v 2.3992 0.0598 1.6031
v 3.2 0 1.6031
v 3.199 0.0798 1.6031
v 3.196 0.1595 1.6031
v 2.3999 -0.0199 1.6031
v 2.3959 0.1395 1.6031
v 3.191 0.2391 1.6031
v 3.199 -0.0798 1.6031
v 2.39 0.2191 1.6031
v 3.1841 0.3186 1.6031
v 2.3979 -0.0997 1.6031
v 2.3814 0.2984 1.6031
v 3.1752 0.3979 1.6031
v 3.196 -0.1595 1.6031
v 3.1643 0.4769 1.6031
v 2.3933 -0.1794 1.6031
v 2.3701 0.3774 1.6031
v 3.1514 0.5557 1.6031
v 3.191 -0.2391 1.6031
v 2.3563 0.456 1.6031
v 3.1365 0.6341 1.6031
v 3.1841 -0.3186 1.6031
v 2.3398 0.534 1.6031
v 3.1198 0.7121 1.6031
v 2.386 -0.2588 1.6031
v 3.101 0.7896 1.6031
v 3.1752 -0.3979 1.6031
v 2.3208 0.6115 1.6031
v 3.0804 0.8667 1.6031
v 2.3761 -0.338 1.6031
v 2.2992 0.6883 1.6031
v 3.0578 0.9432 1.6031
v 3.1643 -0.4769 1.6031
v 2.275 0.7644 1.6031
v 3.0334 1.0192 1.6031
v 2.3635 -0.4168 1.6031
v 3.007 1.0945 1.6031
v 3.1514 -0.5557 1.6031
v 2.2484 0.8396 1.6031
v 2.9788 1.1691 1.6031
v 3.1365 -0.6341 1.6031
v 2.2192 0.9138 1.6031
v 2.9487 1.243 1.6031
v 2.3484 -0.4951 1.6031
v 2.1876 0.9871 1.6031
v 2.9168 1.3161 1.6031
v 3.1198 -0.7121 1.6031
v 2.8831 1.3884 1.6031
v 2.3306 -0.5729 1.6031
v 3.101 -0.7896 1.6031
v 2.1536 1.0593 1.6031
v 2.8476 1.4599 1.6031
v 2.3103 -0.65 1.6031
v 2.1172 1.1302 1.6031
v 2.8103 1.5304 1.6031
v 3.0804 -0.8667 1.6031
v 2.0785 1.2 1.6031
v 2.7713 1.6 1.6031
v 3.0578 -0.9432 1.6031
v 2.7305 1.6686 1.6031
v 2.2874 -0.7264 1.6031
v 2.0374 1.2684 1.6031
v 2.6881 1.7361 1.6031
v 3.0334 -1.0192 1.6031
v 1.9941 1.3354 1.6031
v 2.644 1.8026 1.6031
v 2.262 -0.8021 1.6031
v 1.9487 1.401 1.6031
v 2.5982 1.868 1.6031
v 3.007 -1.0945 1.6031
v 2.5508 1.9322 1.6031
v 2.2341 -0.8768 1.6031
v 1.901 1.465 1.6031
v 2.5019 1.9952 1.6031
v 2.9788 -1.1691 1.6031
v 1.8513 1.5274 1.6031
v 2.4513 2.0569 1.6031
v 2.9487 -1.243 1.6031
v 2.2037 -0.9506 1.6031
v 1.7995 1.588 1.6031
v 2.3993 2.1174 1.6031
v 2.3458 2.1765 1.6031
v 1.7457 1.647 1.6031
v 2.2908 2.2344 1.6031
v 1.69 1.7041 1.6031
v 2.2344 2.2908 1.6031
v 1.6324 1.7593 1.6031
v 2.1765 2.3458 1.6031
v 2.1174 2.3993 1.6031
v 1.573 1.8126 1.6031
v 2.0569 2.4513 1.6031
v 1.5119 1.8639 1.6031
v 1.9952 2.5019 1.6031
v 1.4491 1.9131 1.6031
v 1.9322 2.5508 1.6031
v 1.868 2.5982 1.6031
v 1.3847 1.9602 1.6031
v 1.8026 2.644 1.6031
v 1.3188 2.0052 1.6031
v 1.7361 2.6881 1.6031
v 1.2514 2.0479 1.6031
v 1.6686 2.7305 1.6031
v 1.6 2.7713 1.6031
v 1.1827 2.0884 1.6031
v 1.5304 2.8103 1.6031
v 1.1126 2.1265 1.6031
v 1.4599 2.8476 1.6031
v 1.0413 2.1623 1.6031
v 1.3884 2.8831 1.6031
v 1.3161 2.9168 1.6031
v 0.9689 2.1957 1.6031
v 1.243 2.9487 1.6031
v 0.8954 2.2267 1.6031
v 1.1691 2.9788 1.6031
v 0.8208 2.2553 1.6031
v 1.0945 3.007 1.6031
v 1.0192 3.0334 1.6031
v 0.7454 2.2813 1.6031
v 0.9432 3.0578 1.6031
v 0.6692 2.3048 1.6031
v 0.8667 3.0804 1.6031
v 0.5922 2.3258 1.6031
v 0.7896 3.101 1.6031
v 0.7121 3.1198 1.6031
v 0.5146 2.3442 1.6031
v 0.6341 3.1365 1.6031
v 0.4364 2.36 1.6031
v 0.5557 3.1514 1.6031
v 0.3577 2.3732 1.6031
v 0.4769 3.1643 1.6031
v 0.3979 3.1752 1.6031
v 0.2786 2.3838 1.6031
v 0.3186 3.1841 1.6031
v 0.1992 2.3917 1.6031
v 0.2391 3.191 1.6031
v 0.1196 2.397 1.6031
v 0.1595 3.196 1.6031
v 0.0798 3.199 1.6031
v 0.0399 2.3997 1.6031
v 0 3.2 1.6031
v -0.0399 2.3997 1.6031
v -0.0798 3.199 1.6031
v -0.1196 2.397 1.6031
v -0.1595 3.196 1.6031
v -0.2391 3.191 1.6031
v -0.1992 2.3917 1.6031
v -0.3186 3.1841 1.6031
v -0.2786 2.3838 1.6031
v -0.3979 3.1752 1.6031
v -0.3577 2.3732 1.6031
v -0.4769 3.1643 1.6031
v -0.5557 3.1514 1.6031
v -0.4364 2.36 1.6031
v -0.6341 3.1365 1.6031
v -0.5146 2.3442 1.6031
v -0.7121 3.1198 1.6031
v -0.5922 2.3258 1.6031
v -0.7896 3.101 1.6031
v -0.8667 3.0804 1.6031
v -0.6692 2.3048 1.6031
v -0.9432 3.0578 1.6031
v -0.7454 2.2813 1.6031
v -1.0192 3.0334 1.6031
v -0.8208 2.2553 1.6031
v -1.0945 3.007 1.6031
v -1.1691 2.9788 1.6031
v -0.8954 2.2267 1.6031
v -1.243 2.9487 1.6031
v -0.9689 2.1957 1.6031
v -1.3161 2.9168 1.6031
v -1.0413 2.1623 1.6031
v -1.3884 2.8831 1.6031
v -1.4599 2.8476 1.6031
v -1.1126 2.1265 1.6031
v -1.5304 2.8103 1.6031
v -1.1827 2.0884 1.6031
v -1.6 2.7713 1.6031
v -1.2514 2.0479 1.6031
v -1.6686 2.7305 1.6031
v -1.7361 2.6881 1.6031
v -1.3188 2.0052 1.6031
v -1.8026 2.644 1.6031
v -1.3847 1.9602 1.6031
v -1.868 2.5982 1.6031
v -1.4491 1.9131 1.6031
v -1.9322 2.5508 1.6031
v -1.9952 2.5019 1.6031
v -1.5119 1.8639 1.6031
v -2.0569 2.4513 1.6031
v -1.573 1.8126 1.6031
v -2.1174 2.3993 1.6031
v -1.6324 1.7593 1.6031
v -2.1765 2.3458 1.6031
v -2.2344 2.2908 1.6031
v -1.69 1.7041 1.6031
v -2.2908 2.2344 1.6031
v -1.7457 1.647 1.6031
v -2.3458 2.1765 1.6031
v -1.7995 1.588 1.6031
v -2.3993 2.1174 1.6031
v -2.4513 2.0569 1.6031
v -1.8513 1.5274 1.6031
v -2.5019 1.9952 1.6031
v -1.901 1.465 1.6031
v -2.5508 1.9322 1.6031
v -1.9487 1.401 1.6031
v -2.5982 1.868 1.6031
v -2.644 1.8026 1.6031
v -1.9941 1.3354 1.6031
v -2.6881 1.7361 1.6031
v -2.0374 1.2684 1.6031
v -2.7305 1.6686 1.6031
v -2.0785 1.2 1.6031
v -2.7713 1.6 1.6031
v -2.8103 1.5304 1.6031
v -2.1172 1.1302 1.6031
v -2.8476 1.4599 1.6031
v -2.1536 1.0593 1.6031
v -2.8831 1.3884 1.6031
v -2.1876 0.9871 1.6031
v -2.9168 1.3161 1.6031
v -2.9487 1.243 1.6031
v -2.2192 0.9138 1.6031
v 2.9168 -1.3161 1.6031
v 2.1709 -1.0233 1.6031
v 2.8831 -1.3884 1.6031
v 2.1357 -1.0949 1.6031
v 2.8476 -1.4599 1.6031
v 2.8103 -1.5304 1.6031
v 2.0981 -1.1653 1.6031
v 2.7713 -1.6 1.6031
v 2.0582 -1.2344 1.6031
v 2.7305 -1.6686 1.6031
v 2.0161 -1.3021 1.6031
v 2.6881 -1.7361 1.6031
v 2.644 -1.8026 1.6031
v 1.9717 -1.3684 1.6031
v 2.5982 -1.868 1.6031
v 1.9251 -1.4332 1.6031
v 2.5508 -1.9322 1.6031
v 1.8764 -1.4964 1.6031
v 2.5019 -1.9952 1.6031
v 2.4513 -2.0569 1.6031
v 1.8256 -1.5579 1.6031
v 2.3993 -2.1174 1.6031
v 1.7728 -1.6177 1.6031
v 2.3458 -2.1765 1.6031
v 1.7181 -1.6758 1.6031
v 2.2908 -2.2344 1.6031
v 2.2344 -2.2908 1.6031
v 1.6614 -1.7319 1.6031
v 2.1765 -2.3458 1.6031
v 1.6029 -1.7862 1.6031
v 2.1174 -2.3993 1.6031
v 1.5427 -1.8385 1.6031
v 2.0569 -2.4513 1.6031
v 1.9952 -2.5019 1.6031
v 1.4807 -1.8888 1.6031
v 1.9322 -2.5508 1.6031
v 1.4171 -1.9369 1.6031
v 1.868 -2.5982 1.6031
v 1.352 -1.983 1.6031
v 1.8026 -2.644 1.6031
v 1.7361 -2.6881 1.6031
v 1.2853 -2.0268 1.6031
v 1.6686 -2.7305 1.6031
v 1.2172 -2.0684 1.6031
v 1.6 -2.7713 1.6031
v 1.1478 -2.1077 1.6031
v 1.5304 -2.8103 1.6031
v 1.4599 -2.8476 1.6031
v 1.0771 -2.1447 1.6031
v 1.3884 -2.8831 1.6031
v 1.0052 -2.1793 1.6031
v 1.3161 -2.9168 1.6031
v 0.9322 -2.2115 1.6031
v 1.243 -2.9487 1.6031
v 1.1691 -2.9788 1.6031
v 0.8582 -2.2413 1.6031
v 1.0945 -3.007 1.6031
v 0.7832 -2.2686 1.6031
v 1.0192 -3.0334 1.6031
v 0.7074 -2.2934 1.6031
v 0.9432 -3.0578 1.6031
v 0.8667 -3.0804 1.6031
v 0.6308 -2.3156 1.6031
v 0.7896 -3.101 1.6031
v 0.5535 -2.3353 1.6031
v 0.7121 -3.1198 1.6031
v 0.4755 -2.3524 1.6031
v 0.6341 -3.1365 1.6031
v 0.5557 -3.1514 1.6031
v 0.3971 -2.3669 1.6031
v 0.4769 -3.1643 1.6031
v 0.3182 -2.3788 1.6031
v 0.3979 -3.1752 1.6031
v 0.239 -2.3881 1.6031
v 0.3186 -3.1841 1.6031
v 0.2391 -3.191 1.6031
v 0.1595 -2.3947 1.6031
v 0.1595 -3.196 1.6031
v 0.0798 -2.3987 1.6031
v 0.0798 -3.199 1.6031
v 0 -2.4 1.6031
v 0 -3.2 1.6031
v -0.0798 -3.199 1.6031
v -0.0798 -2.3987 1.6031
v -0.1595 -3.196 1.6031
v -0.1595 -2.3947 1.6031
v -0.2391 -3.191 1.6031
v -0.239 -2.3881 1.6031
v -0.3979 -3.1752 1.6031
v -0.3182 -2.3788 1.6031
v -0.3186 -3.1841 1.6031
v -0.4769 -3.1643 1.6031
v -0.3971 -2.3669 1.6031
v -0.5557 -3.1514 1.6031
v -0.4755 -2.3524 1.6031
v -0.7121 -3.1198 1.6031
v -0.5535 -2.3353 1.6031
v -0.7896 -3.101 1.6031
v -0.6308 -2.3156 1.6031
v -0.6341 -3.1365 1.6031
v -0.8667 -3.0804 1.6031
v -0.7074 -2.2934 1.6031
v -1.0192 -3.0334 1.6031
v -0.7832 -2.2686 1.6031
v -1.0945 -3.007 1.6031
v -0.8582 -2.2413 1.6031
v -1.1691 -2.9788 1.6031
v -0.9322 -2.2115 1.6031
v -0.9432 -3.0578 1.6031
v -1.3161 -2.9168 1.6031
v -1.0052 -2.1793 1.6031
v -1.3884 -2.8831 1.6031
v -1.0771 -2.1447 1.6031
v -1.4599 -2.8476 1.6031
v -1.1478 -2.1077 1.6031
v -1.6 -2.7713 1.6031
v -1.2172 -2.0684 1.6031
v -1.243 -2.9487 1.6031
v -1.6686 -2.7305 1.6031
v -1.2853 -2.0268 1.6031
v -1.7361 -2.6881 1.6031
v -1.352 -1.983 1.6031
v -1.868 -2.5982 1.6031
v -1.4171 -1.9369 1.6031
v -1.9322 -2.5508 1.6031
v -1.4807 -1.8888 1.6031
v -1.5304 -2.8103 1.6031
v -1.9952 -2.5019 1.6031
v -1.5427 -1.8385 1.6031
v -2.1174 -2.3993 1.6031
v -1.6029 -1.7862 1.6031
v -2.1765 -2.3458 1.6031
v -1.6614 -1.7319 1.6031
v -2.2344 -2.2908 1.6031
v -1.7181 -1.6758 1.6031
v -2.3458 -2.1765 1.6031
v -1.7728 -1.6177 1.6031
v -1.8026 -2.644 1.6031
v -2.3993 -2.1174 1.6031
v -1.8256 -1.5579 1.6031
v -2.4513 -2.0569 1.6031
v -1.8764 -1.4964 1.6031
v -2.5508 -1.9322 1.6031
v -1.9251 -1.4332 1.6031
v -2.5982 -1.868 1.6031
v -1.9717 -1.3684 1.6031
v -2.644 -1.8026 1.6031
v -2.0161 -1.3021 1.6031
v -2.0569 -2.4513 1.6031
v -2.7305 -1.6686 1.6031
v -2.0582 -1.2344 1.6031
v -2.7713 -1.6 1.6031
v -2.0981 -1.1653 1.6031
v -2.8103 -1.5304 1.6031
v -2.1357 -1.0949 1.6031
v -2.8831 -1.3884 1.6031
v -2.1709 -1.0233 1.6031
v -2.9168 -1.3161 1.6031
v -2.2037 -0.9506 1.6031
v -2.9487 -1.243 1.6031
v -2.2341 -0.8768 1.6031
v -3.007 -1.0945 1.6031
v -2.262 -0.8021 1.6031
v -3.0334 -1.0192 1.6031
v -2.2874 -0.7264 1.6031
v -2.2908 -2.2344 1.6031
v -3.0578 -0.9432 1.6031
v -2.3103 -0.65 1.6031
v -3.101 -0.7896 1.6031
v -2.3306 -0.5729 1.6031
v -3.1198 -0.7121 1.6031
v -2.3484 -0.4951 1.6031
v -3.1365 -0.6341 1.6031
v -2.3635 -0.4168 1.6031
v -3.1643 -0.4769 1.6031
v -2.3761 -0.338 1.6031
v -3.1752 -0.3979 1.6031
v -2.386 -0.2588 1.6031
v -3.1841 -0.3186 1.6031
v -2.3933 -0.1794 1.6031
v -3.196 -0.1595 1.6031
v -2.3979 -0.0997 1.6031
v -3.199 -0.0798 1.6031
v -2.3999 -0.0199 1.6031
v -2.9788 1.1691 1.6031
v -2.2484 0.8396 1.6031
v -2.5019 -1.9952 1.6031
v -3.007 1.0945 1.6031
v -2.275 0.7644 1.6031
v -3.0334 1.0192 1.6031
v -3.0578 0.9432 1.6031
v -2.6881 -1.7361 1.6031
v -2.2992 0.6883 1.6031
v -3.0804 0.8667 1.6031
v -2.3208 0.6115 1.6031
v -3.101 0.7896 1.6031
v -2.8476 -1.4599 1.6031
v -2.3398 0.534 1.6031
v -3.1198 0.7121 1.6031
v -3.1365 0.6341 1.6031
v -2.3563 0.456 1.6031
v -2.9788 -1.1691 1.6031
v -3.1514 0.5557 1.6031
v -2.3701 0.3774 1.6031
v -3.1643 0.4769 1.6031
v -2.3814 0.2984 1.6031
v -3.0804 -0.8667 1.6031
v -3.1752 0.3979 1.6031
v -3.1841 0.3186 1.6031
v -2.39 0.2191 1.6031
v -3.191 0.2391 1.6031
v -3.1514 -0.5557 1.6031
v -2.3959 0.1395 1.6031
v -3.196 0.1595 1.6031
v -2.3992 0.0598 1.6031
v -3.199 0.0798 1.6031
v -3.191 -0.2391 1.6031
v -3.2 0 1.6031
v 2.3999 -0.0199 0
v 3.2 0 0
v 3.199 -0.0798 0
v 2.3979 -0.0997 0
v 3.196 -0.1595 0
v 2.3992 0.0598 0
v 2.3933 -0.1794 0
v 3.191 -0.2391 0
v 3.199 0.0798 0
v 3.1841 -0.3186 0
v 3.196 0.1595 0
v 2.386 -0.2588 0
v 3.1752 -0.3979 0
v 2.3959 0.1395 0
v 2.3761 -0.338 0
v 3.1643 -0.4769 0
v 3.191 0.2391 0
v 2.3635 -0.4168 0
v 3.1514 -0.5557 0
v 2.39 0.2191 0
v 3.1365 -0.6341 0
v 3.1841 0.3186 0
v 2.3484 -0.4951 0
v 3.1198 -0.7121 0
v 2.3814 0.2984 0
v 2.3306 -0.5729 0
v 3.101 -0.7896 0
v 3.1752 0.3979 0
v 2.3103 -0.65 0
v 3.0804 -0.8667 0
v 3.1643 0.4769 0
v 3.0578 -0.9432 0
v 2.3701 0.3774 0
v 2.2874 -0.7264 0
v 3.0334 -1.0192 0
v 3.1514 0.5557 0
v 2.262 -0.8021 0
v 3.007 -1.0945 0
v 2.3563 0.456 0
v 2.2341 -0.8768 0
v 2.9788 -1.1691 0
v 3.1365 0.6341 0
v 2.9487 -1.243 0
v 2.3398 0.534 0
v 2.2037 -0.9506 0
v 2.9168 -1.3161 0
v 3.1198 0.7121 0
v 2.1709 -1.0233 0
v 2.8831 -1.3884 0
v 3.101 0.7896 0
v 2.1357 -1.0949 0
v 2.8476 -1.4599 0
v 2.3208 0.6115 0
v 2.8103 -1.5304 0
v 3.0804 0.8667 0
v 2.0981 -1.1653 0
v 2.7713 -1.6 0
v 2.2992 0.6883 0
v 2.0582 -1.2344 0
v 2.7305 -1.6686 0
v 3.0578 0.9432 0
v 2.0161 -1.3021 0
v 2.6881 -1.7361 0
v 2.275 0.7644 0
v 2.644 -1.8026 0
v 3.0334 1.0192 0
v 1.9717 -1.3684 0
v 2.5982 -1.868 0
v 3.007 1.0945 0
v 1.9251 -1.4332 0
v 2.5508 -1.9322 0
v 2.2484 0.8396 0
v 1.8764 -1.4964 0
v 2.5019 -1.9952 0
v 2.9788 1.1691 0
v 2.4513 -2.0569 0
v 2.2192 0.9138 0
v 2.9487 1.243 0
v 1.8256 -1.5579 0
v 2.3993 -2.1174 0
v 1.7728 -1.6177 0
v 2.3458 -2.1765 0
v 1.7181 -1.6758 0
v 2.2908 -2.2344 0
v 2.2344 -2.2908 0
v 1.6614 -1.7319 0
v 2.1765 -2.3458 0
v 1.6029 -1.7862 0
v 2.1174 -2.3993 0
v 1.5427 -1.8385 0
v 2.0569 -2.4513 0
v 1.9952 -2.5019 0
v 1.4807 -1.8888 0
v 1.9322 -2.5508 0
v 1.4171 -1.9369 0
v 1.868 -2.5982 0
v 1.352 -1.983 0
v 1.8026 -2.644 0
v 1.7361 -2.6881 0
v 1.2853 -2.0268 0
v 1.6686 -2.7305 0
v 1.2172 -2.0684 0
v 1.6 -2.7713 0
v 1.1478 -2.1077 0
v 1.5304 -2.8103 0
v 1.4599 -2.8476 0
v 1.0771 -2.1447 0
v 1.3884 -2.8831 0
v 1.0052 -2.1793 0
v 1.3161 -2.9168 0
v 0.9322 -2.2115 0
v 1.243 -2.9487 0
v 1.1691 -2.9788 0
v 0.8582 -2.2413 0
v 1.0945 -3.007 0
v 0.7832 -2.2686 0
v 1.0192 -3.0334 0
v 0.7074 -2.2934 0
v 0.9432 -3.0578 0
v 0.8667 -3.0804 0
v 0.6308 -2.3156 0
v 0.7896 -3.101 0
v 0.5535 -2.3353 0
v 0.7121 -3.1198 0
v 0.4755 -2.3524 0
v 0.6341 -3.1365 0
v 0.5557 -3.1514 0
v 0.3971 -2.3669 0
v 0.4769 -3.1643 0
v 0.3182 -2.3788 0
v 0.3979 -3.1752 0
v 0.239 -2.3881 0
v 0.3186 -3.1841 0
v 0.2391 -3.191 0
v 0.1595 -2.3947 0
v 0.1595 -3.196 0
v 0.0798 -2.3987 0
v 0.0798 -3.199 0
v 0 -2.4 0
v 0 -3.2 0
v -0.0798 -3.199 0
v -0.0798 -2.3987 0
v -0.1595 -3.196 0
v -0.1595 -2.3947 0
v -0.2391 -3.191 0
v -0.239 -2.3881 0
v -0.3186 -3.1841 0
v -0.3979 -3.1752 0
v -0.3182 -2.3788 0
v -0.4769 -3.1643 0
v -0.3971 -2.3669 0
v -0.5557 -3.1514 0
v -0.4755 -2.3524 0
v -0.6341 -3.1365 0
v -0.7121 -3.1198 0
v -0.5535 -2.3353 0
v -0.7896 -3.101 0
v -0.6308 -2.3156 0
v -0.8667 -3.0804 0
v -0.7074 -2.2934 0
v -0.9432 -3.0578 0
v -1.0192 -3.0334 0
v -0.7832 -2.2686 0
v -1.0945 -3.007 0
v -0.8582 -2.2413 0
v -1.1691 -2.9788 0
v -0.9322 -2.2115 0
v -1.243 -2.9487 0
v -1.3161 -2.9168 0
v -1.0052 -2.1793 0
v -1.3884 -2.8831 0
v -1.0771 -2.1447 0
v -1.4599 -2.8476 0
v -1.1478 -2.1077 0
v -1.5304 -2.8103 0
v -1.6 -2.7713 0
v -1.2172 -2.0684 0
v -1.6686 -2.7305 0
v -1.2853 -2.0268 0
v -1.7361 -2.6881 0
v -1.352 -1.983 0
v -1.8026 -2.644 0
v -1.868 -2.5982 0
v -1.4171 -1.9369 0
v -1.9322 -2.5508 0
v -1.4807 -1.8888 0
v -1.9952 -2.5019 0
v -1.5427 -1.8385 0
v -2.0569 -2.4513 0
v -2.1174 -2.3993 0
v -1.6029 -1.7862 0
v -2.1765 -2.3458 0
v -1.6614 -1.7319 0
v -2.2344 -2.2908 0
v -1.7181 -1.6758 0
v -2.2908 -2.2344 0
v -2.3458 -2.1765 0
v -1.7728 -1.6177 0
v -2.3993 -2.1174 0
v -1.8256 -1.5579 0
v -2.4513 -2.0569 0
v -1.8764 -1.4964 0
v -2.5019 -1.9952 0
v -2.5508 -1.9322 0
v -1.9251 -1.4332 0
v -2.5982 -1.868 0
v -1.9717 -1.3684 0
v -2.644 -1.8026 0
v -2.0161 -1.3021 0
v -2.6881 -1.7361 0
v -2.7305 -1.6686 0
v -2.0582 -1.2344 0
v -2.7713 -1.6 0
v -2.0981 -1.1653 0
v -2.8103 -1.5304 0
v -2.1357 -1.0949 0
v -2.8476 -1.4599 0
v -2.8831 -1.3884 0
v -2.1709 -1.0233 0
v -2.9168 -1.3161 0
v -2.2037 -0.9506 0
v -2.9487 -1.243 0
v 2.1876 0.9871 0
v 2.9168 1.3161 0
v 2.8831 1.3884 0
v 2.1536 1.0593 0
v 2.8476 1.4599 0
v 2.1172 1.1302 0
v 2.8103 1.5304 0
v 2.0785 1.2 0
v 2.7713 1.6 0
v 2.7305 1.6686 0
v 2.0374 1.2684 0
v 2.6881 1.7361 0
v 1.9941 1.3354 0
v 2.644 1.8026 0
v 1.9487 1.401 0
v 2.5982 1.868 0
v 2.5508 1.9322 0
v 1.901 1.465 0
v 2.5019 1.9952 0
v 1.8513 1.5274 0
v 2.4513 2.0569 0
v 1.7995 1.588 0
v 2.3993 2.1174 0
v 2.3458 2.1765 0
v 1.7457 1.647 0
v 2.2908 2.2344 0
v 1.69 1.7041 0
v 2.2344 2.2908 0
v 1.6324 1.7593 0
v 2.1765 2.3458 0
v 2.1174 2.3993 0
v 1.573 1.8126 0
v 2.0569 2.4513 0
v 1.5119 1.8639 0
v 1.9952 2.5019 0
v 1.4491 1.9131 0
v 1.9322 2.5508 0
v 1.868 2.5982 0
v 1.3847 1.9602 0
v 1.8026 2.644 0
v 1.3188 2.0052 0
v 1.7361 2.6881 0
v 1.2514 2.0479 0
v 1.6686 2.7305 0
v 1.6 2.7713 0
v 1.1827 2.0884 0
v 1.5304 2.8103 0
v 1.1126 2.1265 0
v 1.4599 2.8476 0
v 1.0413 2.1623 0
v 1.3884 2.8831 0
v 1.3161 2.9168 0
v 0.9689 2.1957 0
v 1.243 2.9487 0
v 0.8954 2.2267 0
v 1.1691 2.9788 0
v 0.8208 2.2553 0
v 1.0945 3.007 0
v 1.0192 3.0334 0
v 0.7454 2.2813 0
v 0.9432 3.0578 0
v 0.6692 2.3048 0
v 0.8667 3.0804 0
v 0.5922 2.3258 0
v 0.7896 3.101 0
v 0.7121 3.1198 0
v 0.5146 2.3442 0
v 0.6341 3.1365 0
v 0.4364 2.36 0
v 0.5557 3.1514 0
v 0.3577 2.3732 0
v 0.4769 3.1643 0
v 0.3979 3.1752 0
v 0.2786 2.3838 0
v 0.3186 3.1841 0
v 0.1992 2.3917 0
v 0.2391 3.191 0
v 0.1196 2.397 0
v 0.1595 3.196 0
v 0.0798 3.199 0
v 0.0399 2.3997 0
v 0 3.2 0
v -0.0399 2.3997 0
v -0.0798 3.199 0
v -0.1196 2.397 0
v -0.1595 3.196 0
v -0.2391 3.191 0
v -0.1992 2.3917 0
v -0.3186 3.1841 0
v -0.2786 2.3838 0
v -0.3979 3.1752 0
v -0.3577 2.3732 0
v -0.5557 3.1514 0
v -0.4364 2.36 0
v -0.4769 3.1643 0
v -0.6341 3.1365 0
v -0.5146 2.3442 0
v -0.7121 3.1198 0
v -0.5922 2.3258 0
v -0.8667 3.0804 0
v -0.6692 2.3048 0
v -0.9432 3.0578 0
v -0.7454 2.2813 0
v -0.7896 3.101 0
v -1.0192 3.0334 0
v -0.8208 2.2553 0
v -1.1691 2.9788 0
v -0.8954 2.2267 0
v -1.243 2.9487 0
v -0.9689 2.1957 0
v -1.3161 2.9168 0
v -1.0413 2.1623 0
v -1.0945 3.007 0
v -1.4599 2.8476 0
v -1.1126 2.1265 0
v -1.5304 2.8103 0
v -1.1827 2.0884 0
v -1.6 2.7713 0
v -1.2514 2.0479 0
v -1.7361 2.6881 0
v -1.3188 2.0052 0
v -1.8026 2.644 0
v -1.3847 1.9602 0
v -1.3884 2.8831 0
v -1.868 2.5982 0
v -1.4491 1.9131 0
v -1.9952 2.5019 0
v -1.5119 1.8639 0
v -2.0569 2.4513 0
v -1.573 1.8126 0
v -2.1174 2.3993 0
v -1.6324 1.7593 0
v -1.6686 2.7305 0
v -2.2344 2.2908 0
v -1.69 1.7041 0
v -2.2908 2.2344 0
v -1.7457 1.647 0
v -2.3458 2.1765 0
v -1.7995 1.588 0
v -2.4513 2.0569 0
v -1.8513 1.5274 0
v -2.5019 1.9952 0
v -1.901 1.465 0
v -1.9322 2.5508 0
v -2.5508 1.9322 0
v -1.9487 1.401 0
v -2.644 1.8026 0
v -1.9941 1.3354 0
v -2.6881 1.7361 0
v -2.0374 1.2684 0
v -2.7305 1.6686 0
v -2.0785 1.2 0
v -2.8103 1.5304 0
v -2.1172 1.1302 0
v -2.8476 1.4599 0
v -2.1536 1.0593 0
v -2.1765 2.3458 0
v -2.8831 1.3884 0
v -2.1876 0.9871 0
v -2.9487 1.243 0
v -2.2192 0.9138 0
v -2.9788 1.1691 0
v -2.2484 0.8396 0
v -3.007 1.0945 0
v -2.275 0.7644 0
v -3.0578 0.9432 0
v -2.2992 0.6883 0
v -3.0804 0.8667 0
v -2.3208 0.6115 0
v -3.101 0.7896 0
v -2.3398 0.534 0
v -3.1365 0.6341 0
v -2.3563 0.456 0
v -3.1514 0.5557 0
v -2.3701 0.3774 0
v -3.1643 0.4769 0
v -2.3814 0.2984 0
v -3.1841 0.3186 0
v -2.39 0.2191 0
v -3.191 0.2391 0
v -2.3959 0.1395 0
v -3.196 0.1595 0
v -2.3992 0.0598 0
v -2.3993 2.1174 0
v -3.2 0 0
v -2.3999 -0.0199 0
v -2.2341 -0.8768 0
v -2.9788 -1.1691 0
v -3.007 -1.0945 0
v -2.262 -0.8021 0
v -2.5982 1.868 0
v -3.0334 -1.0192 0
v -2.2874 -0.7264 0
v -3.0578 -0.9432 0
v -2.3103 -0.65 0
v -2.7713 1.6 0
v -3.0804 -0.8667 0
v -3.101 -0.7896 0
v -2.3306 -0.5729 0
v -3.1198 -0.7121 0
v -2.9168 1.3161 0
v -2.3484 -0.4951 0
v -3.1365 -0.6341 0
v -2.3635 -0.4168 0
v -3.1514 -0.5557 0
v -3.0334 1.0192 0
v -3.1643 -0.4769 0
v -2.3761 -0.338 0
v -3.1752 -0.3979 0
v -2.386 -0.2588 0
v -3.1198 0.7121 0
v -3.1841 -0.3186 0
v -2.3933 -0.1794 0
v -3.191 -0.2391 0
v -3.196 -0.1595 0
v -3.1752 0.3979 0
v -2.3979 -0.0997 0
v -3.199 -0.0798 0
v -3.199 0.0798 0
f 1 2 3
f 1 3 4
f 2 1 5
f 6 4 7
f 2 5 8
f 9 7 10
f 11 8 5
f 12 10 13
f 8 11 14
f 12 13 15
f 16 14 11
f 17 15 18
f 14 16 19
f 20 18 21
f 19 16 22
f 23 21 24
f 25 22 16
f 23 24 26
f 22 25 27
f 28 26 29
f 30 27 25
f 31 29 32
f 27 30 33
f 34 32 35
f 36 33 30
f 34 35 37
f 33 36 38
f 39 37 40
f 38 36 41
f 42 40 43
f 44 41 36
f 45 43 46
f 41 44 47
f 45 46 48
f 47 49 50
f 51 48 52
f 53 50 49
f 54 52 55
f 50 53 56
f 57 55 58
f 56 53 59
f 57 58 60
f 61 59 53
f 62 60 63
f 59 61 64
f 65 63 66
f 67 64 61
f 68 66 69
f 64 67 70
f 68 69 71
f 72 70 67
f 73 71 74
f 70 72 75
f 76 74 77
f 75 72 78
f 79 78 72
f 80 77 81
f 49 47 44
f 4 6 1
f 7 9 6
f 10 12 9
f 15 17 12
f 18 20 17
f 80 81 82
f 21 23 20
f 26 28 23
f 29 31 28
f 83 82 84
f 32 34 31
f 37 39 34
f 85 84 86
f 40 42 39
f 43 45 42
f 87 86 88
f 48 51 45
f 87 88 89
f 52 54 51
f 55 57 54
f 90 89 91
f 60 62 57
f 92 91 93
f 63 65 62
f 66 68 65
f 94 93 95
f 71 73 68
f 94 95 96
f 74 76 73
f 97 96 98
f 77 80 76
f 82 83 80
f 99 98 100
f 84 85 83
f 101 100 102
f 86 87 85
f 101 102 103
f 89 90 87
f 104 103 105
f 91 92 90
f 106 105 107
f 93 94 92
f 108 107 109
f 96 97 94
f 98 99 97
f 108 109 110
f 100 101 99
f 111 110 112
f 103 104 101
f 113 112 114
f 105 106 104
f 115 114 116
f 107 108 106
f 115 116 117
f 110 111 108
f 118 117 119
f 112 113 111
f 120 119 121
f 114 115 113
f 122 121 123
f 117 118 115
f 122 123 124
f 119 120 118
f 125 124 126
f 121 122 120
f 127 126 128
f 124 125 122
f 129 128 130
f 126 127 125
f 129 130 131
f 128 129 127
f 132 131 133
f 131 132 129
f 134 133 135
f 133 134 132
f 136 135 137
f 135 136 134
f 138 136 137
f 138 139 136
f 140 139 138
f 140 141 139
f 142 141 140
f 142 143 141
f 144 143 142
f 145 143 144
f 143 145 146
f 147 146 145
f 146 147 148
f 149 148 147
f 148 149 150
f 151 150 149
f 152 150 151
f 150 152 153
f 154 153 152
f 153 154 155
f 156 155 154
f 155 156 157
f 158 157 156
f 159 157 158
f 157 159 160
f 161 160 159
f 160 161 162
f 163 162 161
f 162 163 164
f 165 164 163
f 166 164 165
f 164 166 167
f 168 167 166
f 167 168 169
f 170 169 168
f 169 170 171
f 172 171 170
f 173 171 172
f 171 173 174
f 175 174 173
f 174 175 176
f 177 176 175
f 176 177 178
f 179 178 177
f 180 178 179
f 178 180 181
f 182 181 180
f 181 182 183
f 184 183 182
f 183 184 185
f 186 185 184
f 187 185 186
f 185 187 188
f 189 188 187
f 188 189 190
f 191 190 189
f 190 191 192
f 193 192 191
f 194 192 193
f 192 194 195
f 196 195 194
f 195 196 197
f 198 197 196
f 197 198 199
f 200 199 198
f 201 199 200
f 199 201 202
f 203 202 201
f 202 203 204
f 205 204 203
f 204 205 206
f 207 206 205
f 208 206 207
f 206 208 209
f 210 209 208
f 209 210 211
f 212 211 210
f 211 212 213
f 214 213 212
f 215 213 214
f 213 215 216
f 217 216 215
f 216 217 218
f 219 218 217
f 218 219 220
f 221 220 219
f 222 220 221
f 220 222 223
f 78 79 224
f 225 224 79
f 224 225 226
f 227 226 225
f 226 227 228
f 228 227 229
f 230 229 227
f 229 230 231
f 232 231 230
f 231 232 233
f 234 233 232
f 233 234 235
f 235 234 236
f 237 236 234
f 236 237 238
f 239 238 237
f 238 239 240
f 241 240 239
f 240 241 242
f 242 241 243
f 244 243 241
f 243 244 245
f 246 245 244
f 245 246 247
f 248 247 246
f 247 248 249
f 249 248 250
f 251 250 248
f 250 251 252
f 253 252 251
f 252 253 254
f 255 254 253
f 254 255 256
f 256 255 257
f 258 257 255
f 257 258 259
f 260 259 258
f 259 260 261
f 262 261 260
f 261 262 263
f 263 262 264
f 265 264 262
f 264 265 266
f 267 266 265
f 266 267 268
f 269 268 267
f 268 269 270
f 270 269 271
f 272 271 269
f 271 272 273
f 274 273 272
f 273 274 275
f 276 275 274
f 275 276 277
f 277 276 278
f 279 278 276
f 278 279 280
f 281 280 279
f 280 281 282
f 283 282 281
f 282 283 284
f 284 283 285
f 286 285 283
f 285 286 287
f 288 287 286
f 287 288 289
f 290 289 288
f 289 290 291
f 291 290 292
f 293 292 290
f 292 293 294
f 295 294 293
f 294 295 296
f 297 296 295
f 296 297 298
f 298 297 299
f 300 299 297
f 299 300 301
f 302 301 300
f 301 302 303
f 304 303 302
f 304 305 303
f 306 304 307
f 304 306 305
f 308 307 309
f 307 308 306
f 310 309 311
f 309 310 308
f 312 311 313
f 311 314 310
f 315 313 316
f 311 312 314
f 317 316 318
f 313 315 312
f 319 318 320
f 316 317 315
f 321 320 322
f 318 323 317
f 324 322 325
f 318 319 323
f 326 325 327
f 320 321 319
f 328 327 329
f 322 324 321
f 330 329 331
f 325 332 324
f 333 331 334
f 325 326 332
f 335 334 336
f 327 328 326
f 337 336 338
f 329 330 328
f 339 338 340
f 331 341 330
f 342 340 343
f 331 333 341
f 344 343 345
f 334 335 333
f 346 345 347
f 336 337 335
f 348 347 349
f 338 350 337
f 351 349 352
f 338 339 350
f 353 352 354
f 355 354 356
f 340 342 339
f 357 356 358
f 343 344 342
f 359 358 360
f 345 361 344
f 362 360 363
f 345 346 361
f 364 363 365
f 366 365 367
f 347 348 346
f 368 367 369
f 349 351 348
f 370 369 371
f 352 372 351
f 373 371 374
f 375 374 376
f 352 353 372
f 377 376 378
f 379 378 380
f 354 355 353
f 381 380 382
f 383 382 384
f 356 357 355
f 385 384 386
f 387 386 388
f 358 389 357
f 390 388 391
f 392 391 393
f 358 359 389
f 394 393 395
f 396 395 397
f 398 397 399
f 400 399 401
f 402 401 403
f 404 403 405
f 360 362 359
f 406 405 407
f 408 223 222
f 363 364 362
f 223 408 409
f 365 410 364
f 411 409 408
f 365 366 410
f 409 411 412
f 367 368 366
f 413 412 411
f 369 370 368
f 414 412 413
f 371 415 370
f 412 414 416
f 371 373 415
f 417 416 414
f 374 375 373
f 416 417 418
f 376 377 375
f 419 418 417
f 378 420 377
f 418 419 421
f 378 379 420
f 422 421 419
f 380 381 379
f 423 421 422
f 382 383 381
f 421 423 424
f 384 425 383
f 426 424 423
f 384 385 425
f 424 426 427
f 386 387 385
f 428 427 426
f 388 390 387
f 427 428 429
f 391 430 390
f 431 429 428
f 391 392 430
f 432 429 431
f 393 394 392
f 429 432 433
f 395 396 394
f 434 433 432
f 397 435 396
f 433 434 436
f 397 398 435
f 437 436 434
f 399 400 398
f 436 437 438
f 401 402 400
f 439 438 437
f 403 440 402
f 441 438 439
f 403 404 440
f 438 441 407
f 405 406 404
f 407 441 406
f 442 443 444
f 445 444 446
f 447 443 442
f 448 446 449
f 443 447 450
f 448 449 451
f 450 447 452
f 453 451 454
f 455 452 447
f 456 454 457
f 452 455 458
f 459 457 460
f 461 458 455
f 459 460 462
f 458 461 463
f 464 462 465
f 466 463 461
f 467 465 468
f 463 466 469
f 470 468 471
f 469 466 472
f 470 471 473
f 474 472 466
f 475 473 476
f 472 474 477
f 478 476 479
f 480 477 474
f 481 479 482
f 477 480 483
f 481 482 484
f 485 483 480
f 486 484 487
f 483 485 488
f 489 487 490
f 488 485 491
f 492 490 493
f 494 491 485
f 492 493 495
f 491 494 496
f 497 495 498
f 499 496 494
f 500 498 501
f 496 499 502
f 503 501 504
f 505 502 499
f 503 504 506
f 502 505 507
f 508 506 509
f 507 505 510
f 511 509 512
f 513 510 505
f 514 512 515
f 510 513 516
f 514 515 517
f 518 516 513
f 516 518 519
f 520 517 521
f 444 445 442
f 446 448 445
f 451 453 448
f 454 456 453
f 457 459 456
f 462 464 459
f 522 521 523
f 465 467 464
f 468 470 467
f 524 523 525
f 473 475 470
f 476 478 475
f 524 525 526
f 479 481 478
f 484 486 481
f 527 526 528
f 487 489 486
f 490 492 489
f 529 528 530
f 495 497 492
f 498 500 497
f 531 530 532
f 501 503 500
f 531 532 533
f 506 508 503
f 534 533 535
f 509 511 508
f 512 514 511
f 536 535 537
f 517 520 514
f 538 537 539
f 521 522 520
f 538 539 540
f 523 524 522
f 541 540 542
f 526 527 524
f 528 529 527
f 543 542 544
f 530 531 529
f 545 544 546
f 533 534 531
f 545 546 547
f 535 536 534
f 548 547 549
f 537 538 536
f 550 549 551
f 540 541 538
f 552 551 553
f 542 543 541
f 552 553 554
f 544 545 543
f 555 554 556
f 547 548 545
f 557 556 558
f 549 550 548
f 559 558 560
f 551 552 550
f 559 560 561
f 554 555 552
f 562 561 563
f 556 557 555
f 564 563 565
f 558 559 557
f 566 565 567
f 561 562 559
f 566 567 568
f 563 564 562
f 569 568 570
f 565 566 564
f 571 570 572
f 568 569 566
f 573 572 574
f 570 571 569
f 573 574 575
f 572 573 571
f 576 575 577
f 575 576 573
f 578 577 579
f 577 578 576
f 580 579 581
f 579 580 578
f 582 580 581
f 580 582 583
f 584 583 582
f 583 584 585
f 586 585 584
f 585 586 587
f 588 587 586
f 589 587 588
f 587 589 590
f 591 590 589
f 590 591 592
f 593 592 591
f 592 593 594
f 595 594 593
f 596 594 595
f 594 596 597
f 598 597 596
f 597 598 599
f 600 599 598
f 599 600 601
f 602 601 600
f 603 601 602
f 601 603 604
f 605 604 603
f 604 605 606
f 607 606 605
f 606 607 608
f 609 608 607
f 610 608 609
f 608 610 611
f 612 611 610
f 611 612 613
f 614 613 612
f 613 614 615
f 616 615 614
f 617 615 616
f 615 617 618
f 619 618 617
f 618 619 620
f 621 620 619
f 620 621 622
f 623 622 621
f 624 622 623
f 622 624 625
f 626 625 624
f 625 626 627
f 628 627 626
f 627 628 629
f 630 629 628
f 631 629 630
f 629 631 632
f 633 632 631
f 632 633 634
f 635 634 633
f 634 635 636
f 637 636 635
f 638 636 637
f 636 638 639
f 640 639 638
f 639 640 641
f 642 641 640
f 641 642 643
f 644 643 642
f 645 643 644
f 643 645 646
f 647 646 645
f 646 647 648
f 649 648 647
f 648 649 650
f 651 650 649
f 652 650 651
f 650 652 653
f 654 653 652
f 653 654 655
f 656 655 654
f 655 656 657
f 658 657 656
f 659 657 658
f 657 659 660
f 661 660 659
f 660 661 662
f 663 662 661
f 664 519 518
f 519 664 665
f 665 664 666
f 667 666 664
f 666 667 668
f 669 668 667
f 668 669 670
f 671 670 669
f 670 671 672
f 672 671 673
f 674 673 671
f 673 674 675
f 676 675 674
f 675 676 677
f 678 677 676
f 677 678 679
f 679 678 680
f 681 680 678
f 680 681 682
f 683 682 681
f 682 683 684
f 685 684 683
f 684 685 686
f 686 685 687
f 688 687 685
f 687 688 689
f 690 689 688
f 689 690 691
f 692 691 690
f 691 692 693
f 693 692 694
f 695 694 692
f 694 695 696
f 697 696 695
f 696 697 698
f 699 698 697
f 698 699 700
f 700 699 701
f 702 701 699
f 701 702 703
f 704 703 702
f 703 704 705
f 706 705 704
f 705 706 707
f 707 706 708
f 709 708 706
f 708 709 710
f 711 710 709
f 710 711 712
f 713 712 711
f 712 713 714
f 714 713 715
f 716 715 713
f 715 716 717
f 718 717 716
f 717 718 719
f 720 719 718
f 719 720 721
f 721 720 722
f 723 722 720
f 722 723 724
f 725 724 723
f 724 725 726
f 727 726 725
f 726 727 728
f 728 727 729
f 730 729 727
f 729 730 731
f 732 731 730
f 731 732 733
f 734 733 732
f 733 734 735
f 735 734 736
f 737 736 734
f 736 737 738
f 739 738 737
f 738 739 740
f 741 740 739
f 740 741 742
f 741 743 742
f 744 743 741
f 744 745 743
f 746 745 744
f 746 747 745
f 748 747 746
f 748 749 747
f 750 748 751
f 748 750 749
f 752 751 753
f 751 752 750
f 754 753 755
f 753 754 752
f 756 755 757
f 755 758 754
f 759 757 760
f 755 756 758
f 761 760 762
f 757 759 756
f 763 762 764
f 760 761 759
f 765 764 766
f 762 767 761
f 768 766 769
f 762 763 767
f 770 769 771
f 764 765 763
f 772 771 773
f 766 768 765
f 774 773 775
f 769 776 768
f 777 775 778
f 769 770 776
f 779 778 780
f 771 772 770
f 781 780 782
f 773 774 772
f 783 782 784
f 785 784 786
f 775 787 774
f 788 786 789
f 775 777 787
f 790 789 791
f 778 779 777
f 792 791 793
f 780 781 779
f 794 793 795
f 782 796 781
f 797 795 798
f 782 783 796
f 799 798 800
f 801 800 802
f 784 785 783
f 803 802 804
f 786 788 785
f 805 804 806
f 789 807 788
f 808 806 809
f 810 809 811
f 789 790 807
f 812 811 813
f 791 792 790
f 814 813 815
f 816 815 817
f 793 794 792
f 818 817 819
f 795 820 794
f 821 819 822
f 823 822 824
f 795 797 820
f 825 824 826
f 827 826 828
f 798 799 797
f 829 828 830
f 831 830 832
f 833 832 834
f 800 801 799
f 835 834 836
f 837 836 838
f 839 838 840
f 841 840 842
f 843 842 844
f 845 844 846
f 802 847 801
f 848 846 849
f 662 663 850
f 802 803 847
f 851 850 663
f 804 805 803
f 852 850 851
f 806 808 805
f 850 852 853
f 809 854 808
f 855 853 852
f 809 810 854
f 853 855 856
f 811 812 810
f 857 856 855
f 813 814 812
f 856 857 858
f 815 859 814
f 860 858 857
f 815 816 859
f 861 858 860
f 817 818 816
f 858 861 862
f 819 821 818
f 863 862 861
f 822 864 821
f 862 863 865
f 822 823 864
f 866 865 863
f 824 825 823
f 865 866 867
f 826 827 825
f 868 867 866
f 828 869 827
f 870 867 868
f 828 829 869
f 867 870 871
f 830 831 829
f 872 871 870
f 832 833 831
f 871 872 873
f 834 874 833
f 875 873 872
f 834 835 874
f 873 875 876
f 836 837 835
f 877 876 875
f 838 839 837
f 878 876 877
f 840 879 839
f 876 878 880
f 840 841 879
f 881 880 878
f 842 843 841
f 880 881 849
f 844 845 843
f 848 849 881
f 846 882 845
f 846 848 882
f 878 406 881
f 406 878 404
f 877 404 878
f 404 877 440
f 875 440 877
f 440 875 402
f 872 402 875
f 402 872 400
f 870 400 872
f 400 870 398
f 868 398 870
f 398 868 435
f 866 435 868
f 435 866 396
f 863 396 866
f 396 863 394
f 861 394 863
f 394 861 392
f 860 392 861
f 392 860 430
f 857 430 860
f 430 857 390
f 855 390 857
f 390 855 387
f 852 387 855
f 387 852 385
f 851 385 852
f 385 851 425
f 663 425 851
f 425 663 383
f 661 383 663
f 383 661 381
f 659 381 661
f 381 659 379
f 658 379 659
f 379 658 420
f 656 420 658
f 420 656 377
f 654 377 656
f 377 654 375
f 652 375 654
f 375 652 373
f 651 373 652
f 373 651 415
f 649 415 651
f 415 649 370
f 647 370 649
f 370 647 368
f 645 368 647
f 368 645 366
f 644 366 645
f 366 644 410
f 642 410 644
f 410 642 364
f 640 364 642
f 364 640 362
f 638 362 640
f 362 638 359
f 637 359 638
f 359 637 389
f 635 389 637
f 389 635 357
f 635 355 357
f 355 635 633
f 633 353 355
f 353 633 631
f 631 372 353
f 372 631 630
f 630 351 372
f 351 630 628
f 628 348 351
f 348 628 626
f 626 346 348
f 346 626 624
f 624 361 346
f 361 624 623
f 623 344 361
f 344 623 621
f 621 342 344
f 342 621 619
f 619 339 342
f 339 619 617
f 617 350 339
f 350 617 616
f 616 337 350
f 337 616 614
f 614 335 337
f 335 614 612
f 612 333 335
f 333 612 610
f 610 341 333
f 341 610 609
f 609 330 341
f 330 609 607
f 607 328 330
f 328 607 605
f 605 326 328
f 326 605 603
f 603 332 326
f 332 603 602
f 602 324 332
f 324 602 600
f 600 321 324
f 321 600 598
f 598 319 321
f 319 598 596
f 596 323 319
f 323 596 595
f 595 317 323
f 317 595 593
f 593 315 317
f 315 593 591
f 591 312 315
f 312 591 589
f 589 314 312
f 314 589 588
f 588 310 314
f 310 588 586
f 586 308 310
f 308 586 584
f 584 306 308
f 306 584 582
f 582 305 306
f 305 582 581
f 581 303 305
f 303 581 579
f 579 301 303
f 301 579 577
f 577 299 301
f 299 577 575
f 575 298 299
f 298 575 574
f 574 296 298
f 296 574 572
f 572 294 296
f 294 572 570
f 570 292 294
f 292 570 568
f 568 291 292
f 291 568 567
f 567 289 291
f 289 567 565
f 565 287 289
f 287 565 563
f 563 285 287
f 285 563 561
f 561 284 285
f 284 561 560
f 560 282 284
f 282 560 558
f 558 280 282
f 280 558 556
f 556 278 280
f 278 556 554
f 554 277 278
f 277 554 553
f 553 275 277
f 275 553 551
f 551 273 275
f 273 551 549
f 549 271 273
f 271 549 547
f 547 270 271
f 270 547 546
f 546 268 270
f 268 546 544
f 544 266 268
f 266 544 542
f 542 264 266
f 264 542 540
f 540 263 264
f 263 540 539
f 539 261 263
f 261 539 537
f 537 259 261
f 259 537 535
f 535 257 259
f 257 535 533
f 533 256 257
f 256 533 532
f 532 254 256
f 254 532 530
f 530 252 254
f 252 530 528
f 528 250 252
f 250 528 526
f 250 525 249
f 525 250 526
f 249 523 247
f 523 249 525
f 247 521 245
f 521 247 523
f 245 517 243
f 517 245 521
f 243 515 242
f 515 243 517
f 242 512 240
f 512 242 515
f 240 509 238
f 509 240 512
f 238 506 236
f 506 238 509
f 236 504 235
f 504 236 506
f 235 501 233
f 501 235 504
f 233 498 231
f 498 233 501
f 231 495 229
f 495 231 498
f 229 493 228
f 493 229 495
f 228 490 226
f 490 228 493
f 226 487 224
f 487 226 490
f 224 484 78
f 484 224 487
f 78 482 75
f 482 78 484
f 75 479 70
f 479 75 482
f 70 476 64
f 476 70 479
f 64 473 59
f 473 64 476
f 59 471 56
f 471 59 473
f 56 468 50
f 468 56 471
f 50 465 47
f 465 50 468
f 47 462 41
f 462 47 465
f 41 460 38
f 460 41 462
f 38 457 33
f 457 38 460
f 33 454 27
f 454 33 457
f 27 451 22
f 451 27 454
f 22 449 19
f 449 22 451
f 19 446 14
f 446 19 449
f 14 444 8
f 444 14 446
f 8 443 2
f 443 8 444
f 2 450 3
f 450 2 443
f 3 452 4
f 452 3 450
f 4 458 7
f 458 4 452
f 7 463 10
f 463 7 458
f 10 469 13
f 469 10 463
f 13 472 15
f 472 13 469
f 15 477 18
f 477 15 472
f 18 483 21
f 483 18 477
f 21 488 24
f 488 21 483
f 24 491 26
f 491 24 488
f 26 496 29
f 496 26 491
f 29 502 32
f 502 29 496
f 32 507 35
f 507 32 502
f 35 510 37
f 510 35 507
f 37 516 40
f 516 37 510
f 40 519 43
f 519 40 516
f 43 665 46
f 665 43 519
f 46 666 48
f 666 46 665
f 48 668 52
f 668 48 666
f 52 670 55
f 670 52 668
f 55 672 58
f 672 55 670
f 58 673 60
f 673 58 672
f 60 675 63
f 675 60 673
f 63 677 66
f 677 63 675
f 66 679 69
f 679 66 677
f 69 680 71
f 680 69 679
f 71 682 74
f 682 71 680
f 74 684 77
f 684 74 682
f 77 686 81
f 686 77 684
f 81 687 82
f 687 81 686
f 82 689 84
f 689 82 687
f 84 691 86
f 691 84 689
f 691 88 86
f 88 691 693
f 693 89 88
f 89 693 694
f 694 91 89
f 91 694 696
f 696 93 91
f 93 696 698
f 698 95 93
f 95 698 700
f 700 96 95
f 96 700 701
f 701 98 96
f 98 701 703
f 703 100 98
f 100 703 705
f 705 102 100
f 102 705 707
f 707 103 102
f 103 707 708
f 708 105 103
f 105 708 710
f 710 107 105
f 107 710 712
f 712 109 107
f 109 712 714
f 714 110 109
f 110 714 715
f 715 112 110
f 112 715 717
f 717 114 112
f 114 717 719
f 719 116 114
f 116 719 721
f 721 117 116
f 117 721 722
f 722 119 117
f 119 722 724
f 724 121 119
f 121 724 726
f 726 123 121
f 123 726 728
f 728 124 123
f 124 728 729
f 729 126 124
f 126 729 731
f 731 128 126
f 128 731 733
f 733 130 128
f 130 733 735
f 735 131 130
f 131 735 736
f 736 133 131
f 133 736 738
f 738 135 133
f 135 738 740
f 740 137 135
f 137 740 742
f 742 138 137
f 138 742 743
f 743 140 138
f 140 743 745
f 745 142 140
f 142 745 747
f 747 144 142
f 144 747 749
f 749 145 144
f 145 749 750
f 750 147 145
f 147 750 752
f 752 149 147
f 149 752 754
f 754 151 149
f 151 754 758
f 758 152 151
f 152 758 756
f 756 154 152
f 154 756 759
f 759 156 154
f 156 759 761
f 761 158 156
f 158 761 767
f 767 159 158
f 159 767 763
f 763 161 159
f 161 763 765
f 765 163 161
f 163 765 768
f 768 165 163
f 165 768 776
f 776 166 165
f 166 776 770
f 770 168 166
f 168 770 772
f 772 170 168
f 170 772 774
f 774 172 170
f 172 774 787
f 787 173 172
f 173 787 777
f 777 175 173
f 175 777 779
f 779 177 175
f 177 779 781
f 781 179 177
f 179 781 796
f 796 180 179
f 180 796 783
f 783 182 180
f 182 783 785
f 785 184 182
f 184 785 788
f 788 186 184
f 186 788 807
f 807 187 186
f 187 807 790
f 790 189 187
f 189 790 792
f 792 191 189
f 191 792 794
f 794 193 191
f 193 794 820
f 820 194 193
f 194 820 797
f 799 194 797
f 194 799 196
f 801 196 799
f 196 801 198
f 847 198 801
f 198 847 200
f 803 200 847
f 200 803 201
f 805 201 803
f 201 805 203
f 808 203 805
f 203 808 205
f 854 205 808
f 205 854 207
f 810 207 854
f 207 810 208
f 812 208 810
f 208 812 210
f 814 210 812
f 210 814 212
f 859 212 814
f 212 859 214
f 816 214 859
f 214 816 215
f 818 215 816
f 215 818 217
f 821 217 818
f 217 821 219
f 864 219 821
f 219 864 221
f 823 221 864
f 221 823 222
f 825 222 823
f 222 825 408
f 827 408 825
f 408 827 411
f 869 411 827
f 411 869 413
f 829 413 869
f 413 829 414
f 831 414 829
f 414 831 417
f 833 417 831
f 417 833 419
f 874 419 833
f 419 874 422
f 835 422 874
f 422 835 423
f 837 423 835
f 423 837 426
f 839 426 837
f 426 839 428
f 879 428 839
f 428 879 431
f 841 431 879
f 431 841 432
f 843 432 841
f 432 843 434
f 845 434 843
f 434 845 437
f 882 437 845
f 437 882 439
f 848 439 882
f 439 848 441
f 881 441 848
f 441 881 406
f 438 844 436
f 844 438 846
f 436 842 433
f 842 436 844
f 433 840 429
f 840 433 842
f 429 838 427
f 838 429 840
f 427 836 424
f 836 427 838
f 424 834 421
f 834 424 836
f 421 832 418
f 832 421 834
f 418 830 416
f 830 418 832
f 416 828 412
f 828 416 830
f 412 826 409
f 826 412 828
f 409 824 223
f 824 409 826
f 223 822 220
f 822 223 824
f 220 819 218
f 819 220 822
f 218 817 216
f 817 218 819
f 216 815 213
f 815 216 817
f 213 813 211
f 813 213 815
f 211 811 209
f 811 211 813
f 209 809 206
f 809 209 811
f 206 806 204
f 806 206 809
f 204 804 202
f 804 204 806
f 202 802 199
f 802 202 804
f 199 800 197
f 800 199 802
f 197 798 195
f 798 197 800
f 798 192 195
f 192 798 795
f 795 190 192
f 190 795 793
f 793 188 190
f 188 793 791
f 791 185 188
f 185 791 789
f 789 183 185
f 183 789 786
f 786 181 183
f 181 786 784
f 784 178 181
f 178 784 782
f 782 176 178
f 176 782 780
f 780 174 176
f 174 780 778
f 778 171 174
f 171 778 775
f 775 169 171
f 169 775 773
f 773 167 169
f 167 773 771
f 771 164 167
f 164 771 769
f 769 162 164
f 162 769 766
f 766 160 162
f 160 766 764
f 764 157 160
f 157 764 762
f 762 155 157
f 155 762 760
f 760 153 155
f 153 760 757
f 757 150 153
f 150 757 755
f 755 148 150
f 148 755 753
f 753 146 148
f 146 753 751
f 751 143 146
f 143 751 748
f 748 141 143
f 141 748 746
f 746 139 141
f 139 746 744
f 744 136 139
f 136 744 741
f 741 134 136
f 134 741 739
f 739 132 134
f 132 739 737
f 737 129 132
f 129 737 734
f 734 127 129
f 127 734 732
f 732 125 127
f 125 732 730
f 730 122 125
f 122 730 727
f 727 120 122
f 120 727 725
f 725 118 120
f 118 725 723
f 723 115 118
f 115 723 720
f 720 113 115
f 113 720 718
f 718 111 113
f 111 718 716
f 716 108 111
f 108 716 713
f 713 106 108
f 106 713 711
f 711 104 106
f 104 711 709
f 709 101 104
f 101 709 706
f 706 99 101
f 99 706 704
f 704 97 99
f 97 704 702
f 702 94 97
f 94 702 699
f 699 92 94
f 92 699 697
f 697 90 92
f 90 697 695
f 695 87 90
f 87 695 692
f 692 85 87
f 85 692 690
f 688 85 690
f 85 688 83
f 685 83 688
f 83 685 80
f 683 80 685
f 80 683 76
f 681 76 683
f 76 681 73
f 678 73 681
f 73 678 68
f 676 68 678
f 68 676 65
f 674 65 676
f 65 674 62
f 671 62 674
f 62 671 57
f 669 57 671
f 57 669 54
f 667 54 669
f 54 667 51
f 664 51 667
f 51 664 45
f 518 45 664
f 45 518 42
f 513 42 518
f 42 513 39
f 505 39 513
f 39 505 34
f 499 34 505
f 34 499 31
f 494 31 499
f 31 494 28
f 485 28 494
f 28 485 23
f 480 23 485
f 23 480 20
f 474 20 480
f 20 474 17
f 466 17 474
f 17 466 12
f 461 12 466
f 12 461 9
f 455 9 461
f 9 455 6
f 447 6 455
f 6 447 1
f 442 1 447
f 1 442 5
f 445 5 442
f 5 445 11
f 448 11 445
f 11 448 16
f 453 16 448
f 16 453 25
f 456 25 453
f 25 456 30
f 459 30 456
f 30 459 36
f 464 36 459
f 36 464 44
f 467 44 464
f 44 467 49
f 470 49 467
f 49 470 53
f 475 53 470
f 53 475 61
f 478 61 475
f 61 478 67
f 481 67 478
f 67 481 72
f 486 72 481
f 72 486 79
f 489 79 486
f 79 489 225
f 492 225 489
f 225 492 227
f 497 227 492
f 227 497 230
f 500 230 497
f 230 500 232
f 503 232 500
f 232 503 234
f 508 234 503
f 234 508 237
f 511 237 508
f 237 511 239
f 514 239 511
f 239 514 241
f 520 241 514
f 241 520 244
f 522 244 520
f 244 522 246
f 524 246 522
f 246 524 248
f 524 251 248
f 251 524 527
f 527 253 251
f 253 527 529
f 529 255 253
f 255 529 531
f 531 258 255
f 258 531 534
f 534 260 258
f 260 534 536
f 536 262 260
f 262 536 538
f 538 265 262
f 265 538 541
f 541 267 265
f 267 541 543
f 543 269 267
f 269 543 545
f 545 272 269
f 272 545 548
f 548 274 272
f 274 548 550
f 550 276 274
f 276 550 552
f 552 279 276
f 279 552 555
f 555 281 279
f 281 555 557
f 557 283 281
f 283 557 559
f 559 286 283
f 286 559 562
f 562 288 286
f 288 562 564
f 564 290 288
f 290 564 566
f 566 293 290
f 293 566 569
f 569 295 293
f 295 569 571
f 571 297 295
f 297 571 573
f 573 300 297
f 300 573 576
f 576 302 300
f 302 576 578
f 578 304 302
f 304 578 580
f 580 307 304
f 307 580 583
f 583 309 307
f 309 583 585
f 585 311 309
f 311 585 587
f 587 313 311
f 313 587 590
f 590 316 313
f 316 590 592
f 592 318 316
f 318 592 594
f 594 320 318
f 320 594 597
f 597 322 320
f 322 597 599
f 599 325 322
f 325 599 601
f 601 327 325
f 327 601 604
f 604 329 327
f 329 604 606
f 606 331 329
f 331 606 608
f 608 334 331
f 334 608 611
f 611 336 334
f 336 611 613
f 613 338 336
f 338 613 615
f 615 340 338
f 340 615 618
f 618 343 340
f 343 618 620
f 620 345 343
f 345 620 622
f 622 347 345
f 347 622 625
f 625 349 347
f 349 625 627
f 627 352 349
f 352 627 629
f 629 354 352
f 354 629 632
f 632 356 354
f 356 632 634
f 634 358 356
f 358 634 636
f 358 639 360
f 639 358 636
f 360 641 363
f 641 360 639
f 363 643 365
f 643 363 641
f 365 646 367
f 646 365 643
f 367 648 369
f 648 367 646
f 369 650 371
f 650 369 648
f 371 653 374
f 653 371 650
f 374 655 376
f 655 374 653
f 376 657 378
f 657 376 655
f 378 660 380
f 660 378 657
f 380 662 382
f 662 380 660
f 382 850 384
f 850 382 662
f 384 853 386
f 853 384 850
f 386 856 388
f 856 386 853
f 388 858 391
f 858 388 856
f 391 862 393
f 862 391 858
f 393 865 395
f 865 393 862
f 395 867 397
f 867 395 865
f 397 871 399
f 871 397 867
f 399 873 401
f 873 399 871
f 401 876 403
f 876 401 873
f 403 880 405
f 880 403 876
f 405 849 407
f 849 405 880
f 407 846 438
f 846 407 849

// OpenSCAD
use <../lib.scad>
use <30273.scad>
$fa=1; $fs=0.2;
function ldraw_lib__527(realsolid=false) = [
// 0 ~Moved to 30273
// 0 Name: 527.dat
// 0 Author: [PTadmin]
// 0 !LDRAW_ORG Part UPDATE 2010-03
// 0 !LICENSE Licensed under CC BY 4.0 : see CAreadme.txt
// 
// 0 BFC CERTIFY CCW
  [0,"BFC","CERTIFY"],
  [0,"BFC","CCW"],
// 
// 0 !HISTORY 2010-12-31 [PTadmin] Official Update 2010-03
// 
// 
// 0 // Minifig Helmet with Chinstrap and Wide Brim
// 1 16 0 0 0 1 0 0 0 1 0 0 0 1 30273.dat
  [1,16,0,0,0,1,0,0,0,1,0,0,0,1, ldraw_lib__30273(realsolid)],
];
module ldraw_lib__527(step=0, col=false, unit=2/5, alt=false, line=0.2, solid=!$preview)
    makepoly(ldraw_lib__527(solid), step=step, col=col, unit=unit, alt=alt, line=line, solid=solid);
ldraw_lib__527(line=0.2);
